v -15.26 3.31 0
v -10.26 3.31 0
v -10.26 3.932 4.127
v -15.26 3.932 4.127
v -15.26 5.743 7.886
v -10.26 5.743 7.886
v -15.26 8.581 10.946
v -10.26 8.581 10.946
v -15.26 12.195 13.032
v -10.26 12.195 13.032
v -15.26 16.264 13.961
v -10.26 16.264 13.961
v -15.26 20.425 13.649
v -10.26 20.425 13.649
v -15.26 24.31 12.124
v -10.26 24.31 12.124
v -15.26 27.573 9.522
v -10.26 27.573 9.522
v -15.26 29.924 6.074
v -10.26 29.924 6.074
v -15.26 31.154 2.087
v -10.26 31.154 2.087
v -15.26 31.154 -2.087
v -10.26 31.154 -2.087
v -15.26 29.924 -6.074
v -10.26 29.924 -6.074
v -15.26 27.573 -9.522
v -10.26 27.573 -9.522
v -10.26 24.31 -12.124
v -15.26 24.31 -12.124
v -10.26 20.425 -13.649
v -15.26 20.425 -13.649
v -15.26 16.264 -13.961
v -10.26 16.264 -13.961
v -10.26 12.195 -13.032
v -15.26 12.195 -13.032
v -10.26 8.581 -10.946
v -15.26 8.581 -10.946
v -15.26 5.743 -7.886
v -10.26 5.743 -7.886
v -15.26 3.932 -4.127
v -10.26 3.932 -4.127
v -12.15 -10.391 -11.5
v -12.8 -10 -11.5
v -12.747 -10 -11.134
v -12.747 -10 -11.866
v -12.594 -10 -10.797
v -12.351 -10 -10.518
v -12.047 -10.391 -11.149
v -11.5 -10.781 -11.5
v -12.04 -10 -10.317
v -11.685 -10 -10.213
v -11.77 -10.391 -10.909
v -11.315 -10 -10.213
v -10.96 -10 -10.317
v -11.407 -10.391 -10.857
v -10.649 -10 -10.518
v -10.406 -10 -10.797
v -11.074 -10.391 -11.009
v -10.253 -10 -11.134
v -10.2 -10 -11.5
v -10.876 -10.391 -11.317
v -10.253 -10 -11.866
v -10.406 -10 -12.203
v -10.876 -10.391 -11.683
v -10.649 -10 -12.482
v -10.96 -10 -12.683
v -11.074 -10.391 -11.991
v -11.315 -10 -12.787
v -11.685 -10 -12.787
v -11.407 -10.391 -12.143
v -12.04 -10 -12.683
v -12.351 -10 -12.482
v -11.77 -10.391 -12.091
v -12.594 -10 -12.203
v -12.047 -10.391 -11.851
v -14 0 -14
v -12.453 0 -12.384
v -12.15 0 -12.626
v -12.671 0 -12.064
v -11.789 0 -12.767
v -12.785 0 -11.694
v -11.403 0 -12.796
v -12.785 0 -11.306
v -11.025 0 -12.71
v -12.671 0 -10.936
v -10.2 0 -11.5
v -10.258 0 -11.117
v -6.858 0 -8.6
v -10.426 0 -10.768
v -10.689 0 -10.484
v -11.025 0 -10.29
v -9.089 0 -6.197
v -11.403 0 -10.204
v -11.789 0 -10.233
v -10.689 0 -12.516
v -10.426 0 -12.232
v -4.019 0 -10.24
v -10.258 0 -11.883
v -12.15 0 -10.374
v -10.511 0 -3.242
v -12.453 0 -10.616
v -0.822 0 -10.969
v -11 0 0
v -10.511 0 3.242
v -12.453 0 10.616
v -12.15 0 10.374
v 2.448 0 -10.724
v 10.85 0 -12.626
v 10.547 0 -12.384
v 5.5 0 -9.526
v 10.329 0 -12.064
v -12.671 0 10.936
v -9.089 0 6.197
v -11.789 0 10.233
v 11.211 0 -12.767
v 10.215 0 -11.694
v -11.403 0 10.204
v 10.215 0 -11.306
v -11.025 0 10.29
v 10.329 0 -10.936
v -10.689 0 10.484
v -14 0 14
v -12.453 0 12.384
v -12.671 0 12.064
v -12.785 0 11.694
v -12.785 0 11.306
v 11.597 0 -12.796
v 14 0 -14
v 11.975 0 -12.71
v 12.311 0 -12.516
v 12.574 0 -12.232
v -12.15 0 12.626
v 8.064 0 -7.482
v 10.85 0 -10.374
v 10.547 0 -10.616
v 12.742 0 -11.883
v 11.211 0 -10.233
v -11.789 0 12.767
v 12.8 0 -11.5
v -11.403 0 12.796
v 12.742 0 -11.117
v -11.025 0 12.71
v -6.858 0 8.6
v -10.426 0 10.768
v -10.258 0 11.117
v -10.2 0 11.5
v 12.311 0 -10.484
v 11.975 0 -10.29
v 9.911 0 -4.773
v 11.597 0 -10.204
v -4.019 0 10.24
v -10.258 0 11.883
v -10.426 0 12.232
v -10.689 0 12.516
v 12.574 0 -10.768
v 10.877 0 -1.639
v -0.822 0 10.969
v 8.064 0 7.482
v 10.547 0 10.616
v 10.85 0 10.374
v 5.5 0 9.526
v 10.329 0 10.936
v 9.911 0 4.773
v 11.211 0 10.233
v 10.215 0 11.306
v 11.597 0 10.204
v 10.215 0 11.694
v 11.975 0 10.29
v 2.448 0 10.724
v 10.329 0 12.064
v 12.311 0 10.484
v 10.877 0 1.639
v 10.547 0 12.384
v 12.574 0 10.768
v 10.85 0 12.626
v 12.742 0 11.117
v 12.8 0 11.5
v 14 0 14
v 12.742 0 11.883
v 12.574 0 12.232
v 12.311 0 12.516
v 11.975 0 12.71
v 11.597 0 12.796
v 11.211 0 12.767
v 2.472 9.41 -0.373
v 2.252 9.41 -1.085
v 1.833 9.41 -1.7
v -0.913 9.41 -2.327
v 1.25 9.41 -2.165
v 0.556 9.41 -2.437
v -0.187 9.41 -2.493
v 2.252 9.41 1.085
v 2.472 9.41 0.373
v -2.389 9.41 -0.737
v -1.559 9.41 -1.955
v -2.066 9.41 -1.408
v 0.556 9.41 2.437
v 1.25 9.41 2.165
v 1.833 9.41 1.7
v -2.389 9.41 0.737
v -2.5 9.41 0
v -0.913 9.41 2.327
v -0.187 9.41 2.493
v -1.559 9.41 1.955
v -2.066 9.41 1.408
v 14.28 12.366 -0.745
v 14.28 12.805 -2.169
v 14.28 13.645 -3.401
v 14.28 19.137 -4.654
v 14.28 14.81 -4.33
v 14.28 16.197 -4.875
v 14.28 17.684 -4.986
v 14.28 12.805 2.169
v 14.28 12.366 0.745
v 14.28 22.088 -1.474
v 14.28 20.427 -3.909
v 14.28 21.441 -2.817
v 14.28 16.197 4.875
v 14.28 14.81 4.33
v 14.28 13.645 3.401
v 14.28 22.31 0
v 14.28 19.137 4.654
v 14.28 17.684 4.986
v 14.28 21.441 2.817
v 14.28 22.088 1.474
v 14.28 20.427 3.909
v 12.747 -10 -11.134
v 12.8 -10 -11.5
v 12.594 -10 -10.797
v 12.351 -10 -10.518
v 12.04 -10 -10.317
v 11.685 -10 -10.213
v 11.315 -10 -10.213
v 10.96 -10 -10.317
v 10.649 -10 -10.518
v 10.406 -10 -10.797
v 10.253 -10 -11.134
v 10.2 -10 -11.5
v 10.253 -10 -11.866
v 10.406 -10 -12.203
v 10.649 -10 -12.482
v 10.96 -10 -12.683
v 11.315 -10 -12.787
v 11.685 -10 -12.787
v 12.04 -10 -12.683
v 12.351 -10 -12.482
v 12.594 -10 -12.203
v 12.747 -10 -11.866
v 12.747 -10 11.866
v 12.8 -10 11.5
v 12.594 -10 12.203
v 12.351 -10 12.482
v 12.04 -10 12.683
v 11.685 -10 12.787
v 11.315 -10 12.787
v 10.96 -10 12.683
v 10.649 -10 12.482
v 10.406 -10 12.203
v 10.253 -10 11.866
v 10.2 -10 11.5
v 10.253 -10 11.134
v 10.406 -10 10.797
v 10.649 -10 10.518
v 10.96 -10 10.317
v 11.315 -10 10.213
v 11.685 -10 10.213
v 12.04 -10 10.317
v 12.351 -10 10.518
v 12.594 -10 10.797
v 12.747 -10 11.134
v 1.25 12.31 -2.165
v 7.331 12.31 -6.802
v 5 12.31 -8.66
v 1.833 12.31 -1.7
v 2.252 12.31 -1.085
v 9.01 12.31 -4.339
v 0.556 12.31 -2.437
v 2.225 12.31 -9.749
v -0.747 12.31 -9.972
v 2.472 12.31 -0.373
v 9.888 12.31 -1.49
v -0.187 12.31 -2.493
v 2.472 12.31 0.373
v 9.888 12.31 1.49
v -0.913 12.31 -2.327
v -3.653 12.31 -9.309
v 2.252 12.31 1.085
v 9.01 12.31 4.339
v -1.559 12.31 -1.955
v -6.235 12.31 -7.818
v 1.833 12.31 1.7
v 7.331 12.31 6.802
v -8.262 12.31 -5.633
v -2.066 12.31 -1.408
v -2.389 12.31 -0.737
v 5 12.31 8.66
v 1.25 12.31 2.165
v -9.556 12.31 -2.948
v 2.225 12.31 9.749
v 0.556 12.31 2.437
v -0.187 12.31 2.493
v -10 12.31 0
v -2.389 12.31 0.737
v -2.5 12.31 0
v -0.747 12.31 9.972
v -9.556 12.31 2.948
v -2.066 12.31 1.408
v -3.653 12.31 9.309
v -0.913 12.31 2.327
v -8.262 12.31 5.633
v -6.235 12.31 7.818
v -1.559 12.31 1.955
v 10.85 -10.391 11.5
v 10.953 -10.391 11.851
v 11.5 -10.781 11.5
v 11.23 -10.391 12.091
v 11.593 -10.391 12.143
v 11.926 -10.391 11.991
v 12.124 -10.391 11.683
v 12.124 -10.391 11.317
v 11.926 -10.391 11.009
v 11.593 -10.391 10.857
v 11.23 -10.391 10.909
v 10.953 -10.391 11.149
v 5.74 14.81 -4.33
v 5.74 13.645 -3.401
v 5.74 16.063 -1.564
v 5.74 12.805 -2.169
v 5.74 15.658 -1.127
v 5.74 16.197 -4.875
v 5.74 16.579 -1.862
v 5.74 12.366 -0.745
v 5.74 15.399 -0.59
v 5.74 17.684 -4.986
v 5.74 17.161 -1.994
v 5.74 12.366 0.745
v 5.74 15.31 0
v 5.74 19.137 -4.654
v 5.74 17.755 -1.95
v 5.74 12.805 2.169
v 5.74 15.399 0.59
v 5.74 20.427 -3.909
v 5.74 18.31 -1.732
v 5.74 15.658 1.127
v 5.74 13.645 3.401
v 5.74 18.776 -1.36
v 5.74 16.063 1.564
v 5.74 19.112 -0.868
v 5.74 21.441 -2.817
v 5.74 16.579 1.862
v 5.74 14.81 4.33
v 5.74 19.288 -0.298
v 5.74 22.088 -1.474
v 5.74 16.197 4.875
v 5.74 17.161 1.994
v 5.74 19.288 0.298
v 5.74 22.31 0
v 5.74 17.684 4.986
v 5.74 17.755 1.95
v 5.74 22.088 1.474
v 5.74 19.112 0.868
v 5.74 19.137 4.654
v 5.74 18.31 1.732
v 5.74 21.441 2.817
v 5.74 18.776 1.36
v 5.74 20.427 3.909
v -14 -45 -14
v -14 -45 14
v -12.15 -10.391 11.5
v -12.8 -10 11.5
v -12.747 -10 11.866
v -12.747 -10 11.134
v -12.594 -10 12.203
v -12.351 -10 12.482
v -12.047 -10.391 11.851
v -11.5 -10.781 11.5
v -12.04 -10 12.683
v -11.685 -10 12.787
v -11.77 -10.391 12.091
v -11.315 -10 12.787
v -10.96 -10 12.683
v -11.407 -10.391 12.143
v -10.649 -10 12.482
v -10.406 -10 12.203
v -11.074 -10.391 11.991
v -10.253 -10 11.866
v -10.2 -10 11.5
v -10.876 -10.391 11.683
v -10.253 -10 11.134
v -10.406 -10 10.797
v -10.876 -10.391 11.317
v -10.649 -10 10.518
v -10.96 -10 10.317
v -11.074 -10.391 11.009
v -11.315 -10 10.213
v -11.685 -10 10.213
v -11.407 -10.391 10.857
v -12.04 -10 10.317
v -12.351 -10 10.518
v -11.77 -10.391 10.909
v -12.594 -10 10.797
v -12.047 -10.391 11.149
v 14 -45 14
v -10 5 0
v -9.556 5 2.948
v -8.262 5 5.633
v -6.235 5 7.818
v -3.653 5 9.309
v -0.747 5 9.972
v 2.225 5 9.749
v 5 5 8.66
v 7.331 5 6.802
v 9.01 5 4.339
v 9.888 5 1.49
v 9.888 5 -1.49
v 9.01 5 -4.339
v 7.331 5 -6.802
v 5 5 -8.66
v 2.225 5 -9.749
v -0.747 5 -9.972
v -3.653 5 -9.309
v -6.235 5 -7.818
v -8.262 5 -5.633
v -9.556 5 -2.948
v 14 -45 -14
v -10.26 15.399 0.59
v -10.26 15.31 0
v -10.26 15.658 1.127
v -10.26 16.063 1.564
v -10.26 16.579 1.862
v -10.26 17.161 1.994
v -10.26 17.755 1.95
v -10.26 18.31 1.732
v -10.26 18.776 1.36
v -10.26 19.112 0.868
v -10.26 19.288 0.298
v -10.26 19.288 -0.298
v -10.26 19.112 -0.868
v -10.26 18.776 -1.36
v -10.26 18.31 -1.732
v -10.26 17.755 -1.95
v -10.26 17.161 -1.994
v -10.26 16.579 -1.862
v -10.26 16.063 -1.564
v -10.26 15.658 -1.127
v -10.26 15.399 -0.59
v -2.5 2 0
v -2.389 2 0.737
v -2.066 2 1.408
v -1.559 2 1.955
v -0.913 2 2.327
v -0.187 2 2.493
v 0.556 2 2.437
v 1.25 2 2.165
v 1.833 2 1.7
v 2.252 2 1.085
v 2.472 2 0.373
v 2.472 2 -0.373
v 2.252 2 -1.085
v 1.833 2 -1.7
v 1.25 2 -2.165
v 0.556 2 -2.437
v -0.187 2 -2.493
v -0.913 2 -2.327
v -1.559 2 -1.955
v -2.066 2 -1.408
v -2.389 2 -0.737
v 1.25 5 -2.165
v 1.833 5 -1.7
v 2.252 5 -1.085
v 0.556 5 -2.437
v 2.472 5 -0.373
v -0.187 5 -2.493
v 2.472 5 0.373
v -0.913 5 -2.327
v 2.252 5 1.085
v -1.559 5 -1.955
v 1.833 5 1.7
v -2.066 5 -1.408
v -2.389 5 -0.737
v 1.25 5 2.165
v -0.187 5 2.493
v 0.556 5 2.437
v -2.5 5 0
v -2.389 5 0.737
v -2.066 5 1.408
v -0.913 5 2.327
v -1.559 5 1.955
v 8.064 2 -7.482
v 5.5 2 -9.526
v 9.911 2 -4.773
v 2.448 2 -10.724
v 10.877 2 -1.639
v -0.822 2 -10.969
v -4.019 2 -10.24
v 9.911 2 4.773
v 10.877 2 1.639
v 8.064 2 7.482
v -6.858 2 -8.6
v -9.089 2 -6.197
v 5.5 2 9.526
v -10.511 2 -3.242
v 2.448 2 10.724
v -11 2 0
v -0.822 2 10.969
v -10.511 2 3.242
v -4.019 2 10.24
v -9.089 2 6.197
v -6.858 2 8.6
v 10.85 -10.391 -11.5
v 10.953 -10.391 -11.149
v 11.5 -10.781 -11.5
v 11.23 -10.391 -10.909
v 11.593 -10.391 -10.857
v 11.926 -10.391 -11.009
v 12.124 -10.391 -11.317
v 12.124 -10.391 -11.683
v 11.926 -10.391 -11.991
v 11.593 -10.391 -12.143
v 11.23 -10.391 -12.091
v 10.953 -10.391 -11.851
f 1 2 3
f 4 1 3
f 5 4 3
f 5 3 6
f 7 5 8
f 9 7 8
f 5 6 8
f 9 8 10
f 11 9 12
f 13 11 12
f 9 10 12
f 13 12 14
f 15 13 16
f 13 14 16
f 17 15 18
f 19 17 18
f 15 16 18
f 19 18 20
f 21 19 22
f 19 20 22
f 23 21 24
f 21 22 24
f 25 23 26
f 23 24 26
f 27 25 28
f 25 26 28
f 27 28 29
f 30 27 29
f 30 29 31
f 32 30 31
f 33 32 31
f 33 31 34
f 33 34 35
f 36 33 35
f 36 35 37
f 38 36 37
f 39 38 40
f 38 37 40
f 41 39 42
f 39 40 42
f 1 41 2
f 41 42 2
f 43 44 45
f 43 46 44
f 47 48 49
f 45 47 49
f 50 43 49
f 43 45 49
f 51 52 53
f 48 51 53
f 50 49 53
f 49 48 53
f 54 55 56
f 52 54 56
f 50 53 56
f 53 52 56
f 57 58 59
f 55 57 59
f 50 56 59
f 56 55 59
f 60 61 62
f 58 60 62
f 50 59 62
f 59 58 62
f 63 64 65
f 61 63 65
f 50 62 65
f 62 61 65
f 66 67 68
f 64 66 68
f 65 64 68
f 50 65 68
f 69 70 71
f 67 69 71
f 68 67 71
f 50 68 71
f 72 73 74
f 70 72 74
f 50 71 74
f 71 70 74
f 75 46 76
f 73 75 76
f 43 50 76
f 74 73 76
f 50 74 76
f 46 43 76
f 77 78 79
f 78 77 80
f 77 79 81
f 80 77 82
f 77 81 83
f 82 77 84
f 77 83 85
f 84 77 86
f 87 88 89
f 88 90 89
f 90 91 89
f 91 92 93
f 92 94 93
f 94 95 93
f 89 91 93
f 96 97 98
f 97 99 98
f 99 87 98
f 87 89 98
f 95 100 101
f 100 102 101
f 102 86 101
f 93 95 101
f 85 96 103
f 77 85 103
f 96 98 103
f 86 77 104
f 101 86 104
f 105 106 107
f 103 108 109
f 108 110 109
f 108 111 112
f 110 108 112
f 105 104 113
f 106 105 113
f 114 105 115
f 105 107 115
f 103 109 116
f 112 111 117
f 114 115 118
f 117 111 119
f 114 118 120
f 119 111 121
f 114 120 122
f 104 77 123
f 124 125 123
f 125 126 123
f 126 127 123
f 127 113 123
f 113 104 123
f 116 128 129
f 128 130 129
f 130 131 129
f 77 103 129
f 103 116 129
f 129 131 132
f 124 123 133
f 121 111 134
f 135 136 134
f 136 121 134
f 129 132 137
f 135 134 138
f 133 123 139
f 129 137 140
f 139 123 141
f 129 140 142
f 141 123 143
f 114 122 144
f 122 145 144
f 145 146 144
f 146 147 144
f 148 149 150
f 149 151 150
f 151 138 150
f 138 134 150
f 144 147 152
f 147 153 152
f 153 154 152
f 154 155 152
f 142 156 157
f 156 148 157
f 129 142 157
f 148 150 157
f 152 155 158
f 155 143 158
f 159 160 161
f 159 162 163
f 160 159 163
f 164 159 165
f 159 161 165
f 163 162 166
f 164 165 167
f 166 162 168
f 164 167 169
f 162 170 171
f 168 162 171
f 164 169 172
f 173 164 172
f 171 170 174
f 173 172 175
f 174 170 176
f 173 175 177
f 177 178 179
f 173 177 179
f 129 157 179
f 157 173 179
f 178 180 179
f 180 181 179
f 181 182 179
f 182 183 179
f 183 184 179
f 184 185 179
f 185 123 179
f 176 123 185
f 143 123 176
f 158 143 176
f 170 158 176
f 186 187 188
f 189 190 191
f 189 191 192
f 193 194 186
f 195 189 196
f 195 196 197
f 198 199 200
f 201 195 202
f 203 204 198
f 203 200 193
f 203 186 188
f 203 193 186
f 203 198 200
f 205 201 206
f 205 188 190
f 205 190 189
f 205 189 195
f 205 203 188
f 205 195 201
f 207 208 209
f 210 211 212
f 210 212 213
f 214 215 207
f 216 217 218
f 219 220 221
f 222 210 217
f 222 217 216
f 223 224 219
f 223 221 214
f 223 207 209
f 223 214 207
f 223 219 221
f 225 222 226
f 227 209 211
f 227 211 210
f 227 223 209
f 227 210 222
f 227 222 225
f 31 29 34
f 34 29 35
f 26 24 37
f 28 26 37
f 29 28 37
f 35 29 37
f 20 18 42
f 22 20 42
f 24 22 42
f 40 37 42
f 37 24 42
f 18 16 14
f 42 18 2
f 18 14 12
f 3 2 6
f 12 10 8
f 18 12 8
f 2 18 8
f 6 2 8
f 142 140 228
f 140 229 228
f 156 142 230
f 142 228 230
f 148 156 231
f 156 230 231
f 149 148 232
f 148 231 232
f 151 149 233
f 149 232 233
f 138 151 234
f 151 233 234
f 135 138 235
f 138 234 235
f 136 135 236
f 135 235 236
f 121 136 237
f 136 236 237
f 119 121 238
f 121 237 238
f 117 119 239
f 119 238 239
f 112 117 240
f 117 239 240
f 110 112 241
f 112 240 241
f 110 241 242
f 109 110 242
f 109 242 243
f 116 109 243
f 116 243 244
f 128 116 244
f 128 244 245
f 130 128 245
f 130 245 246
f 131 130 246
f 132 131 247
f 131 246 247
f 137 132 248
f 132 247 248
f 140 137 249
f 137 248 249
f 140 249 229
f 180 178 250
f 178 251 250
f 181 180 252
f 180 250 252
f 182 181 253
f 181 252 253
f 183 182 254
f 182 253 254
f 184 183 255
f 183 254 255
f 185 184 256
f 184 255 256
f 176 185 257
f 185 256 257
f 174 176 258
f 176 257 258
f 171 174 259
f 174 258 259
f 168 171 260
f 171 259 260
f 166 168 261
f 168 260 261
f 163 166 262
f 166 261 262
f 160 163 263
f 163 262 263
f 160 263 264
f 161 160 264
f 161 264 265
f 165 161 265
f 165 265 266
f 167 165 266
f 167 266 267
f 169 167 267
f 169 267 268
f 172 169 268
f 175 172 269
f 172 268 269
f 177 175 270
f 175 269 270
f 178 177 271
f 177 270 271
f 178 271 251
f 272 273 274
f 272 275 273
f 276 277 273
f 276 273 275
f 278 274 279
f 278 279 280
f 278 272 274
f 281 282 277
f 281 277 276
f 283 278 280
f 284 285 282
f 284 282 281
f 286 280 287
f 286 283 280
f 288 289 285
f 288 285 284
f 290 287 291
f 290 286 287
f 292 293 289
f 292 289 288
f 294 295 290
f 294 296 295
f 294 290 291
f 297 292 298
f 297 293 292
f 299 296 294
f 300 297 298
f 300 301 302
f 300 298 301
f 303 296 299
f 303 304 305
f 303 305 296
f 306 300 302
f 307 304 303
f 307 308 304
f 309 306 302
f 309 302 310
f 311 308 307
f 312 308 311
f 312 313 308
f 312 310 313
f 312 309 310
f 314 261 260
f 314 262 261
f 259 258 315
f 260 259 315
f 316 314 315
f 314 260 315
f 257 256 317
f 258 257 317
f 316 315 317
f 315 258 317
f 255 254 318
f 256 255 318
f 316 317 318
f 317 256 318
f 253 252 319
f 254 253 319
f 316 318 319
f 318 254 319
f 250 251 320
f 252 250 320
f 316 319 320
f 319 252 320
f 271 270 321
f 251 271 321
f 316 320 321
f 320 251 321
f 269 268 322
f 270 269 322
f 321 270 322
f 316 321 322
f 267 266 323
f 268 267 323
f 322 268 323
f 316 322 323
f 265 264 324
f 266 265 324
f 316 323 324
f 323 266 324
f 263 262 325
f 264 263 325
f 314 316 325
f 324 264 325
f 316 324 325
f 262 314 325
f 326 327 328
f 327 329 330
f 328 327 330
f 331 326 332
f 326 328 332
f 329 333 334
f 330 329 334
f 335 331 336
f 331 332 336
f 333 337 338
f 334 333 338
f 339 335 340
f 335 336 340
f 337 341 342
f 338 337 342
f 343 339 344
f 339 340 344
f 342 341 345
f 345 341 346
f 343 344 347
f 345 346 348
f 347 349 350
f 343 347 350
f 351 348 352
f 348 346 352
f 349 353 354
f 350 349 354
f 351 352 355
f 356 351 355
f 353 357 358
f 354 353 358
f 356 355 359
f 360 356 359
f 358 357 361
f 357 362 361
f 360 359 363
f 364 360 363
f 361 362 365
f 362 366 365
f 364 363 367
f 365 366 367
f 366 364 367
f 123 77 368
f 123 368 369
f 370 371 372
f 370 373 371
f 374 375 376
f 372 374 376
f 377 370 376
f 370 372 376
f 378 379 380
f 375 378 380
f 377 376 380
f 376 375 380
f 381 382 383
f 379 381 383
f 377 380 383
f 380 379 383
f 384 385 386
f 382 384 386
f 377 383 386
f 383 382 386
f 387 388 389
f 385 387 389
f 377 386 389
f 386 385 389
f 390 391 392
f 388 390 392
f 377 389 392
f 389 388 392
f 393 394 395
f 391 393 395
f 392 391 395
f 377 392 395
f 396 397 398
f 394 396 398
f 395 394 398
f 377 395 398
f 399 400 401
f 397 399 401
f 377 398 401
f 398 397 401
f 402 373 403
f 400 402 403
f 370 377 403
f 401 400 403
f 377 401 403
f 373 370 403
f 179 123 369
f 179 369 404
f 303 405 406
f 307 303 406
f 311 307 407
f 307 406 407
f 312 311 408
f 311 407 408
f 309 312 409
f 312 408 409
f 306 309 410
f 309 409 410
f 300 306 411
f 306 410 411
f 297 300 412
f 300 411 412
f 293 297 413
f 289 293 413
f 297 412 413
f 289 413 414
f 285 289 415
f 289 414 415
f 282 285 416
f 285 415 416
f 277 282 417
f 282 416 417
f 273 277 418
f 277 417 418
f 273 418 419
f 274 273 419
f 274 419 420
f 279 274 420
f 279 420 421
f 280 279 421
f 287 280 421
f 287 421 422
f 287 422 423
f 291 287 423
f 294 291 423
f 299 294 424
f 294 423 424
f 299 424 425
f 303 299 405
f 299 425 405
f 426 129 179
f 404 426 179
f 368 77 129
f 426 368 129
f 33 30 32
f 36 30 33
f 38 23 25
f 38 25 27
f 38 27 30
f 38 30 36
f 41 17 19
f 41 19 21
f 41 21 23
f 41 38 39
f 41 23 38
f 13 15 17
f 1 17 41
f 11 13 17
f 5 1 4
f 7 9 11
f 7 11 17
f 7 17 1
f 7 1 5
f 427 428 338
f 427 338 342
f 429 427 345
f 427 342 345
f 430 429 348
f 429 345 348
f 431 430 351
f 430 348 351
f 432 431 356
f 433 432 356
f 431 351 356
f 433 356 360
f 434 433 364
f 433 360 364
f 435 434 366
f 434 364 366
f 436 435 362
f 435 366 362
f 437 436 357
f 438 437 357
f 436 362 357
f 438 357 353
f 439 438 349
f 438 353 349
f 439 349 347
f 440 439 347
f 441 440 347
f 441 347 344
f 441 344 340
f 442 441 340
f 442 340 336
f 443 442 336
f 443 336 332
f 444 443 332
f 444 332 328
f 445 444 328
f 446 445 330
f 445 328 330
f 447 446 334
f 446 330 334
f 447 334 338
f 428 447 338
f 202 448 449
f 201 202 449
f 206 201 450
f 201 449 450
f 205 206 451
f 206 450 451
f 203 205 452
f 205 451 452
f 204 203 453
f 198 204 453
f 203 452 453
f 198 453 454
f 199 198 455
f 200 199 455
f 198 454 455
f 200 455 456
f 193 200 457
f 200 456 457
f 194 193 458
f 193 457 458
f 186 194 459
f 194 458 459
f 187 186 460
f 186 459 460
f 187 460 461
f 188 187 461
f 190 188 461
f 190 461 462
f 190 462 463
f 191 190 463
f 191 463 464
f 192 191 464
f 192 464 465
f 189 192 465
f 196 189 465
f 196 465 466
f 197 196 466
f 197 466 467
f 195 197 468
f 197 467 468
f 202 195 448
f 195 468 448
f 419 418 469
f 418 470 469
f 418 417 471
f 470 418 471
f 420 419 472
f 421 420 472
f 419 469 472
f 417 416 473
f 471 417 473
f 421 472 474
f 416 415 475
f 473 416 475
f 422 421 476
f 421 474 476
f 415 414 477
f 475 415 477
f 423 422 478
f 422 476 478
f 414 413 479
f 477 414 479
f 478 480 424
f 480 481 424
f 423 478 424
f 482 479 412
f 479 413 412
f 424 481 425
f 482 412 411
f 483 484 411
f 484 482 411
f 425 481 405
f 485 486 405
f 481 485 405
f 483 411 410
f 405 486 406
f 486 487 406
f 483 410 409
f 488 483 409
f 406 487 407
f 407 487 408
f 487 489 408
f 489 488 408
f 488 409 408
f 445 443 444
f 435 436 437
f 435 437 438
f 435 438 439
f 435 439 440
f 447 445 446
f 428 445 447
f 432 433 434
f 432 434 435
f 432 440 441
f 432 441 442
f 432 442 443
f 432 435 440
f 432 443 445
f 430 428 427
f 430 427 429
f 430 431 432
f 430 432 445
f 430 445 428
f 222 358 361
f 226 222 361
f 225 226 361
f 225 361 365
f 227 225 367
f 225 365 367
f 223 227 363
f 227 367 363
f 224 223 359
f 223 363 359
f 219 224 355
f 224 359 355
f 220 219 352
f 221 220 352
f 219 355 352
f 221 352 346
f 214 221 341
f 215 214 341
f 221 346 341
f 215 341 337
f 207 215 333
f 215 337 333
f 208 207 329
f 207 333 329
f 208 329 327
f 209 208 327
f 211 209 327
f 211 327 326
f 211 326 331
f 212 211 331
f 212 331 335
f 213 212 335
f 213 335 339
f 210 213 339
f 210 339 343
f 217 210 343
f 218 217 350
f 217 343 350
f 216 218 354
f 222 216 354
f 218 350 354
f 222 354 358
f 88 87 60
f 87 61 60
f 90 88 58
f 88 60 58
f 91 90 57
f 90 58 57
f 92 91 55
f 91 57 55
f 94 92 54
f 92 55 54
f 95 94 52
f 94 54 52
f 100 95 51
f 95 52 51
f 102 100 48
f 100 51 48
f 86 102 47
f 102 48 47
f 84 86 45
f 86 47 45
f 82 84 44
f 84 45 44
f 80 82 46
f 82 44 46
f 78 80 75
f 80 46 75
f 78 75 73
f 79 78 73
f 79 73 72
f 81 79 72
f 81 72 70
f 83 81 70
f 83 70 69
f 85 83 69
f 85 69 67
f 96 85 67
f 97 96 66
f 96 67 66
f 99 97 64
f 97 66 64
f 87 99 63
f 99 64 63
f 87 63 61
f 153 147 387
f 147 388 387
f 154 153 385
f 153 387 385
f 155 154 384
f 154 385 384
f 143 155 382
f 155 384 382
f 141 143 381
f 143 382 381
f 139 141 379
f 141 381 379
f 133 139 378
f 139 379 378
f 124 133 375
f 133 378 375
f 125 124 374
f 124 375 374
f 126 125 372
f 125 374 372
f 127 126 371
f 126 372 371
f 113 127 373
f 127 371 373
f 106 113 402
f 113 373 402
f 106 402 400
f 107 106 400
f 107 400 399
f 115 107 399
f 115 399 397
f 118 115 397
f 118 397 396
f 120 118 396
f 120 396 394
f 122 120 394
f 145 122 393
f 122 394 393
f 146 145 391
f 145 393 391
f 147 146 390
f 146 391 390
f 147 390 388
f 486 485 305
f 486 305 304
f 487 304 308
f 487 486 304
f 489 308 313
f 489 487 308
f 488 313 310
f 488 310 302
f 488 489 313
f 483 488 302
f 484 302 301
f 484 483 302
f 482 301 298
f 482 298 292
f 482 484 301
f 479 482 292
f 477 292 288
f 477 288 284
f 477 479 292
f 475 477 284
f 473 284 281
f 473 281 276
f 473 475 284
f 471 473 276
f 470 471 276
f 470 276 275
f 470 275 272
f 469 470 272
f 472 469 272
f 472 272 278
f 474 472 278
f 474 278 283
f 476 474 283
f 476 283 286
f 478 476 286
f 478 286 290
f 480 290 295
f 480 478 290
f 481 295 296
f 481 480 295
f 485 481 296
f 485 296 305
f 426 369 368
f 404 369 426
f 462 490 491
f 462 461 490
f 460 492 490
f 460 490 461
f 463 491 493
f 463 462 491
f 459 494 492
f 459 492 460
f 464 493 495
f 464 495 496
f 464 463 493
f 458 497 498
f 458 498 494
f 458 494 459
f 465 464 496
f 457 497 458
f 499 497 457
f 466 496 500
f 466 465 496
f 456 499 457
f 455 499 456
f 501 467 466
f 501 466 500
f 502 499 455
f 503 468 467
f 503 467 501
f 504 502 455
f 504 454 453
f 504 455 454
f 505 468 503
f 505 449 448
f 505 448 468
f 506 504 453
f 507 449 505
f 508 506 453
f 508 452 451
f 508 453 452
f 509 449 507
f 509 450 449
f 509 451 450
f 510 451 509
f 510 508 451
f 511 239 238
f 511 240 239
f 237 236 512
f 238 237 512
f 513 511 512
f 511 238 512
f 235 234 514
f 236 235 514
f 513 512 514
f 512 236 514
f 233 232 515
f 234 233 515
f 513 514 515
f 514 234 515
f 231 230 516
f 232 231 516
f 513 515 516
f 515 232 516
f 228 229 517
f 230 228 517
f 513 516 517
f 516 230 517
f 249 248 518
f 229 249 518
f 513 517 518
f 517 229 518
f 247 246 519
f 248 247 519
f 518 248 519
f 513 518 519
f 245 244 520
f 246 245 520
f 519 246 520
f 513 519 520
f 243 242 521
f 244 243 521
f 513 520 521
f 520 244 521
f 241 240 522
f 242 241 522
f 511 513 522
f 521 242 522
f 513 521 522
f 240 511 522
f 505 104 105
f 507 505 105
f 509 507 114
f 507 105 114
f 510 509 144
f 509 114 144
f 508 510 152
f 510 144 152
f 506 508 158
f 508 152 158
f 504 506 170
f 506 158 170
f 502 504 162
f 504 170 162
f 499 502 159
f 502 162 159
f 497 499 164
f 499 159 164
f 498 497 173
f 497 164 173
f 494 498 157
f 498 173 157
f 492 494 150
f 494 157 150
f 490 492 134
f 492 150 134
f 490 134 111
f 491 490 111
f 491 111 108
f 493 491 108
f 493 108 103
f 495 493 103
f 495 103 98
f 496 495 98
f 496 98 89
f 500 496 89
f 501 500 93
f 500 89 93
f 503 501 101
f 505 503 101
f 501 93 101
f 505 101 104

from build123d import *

# Parameters (mm, degrees)
F0_W      = 28
F0_H      = 28
F1_DEPTH  = 45
F2_R      = 11
F3_DEPTH  = 2
F5_D      = 2.6
F5_DEPTH  = 10
F5_TIP    = 0.7811188047
F6_R      = 2.5
F7_DEPTH  = 7.41
F9_R      = 10
F9_R_2    = 2.5
F10_DEPTH = 7.31
F12_R     = 5
F13_DEPTH = 8.54
F14_R     = 2
F15_DEPTH = 16
F16_R     = 14
F16_R_2   = 2
F17_DEPTH = 5


with BuildPart() as f1:
    # F0 (on Front) → F1 (new body)
    with BuildSketch(Plane.XZ):
        Rectangle(F0_W, F0_H)
    extrude(amount=F1_DEPTH)

    # F2 (on face) → F3 (join)
    with BuildSketch(Plane(origin=(0, 0, 0), x_dir=(-1, 0, 0), z_dir=(0, 1, 0))):
        Circle(F2_R)
    extrude(amount=F3_DEPTH)

    # F5
    with Locations(Plane(origin=(0, 0, 0), x_dir=(-1, 0, 0), z_dir=(0, 1, 0))):
        with Locations((-11.5, 11.5), (11.5, 11.5), (11.5, -11.5), (-11.5, -11.5)):
            Hole(F5_D / 2, depth=F5_DEPTH)
            with Locations((0, 0, -(F5_DEPTH + F5_TIP / 2))):  # 118° drill point
                Cone(0, F5_D / 2, F5_TIP, mode=Mode.SUBTRACT)

    # F6 (on face) → F7 (join)
    with BuildSketch(Plane(origin=(0, 2, 0), x_dir=(-1, 0, 0), z_dir=(0, 1, 0))):
        Circle(F6_R)
    extrude(amount=F7_DEPTH)


with BuildPart() as f10:
    # F9 (on offset) → F10 (new body)
    with BuildSketch(Plane(origin=(0, 5, 0), x_dir=(-1, 0, 0), z_dir=(0, 1, 0))):
        Circle(F9_R)
        Circle(F9_R_2, mode=Mode.SUBTRACT)
    extrude(amount=F10_DEPTH)


with BuildPart() as f13:
    # F12 (on offset) → F13 (new body)
    with BuildSketch(Plane.YZ.offset(5.74)):
        with Locations((17.31, 0)):
            Circle(F12_R)
    extrude(amount=F13_DEPTH)

    # F14 (on face) → F15 (join)
    with BuildSketch(Plane(origin=(5.74, 0, 0), x_dir=(0, -1, 0), z_dir=(-1, 0, 0))):
        with Locations((-17.31, 0)):
            Circle(F14_R)
    extrude(amount=F15_DEPTH)


with BuildPart() as f17:
    # F16 (on face) → F17 (new body)
    with BuildSketch(Plane(origin=(-10.26, 0, 0), x_dir=(0, -1, 0), z_dir=(-1, 0, 0))):
        with Locations((-17.31, 0)):
            Circle(F16_R)
        with Locations((-17.31, 0)):
            Circle(F16_R_2, mode=Mode.SUBTRACT)
        with Locations((-17.31, 0)):
            Circle(F16_R_2)
    extrude(amount=F17_DEPTH)


solid = Compound([f1.part, f10.part, f13.part, f17.part])
